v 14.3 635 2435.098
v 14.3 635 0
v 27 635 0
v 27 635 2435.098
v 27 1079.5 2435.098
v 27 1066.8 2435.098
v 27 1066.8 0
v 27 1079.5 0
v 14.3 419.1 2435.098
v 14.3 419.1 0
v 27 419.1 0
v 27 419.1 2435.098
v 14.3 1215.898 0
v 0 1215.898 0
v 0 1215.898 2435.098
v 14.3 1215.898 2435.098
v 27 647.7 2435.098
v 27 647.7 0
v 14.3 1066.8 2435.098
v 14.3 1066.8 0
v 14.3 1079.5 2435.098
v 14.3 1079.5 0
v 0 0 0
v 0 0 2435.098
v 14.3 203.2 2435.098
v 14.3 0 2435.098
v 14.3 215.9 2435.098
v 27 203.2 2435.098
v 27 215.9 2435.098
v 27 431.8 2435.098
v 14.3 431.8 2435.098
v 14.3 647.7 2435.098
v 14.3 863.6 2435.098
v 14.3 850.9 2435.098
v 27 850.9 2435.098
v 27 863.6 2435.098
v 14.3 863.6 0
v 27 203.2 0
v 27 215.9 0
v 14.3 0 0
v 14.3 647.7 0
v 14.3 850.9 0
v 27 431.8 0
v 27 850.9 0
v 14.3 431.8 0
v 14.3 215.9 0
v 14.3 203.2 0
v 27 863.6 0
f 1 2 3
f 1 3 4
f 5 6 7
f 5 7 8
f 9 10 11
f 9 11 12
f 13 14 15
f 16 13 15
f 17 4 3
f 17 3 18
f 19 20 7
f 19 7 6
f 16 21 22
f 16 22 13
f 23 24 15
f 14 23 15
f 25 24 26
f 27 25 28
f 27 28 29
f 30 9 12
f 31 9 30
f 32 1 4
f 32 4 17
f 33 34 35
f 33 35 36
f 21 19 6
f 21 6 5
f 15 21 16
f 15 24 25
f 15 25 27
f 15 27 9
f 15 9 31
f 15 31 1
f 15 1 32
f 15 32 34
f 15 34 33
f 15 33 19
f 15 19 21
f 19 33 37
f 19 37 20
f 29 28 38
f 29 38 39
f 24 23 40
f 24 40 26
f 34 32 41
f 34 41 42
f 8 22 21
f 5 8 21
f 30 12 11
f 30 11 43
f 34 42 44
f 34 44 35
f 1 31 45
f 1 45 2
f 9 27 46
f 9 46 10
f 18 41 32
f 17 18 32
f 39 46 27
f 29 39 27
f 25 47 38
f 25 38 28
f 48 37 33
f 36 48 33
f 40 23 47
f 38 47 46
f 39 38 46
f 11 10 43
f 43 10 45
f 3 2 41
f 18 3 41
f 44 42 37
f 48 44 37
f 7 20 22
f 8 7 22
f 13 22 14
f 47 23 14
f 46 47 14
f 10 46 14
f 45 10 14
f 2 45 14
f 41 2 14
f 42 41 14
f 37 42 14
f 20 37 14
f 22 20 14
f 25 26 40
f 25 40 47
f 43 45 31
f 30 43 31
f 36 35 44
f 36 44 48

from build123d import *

# Parameters (mm, degrees)
F0_W     = 1215.898
F0_H     = 2435.098
F1_DEPTH = 14.3002
F2_W     = 12.7
F2_H     = 2435.098
F3_DEPTH = 12.7


# Not quite as in the source:
# - a feature names something its author has since deleted; it is built from what else it names


with BuildPart() as f1:
    # F0 (on Right) → F1 (new body)
    with BuildSketch(Plane.YZ):
        with Locations((607.949, 1217.549)):
            Rectangle(F0_W, F0_H)
    extrude(amount=F1_DEPTH)

    # F2 (on face) → F3 (join)
    with BuildSketch(Plane.YZ.offset(14.3002)):
        with Locations((425.45, 1217.549)):
            Rectangle(F2_W, F2_H)
        with Locations((641.35, 1217.549)):
            Rectangle(F2_W, F2_H)
        with Locations((857.25, 1217.549)):
            Rectangle(F2_W, F2_H)
        with Locations((1073.15, 1217.549)):
            Rectangle(F2_W, F2_H)
        with Locations((209.55, 1217.549)):
            Rectangle(F2_W, F2_H)
    extrude(amount=F3_DEPTH)


solid = f1.part
